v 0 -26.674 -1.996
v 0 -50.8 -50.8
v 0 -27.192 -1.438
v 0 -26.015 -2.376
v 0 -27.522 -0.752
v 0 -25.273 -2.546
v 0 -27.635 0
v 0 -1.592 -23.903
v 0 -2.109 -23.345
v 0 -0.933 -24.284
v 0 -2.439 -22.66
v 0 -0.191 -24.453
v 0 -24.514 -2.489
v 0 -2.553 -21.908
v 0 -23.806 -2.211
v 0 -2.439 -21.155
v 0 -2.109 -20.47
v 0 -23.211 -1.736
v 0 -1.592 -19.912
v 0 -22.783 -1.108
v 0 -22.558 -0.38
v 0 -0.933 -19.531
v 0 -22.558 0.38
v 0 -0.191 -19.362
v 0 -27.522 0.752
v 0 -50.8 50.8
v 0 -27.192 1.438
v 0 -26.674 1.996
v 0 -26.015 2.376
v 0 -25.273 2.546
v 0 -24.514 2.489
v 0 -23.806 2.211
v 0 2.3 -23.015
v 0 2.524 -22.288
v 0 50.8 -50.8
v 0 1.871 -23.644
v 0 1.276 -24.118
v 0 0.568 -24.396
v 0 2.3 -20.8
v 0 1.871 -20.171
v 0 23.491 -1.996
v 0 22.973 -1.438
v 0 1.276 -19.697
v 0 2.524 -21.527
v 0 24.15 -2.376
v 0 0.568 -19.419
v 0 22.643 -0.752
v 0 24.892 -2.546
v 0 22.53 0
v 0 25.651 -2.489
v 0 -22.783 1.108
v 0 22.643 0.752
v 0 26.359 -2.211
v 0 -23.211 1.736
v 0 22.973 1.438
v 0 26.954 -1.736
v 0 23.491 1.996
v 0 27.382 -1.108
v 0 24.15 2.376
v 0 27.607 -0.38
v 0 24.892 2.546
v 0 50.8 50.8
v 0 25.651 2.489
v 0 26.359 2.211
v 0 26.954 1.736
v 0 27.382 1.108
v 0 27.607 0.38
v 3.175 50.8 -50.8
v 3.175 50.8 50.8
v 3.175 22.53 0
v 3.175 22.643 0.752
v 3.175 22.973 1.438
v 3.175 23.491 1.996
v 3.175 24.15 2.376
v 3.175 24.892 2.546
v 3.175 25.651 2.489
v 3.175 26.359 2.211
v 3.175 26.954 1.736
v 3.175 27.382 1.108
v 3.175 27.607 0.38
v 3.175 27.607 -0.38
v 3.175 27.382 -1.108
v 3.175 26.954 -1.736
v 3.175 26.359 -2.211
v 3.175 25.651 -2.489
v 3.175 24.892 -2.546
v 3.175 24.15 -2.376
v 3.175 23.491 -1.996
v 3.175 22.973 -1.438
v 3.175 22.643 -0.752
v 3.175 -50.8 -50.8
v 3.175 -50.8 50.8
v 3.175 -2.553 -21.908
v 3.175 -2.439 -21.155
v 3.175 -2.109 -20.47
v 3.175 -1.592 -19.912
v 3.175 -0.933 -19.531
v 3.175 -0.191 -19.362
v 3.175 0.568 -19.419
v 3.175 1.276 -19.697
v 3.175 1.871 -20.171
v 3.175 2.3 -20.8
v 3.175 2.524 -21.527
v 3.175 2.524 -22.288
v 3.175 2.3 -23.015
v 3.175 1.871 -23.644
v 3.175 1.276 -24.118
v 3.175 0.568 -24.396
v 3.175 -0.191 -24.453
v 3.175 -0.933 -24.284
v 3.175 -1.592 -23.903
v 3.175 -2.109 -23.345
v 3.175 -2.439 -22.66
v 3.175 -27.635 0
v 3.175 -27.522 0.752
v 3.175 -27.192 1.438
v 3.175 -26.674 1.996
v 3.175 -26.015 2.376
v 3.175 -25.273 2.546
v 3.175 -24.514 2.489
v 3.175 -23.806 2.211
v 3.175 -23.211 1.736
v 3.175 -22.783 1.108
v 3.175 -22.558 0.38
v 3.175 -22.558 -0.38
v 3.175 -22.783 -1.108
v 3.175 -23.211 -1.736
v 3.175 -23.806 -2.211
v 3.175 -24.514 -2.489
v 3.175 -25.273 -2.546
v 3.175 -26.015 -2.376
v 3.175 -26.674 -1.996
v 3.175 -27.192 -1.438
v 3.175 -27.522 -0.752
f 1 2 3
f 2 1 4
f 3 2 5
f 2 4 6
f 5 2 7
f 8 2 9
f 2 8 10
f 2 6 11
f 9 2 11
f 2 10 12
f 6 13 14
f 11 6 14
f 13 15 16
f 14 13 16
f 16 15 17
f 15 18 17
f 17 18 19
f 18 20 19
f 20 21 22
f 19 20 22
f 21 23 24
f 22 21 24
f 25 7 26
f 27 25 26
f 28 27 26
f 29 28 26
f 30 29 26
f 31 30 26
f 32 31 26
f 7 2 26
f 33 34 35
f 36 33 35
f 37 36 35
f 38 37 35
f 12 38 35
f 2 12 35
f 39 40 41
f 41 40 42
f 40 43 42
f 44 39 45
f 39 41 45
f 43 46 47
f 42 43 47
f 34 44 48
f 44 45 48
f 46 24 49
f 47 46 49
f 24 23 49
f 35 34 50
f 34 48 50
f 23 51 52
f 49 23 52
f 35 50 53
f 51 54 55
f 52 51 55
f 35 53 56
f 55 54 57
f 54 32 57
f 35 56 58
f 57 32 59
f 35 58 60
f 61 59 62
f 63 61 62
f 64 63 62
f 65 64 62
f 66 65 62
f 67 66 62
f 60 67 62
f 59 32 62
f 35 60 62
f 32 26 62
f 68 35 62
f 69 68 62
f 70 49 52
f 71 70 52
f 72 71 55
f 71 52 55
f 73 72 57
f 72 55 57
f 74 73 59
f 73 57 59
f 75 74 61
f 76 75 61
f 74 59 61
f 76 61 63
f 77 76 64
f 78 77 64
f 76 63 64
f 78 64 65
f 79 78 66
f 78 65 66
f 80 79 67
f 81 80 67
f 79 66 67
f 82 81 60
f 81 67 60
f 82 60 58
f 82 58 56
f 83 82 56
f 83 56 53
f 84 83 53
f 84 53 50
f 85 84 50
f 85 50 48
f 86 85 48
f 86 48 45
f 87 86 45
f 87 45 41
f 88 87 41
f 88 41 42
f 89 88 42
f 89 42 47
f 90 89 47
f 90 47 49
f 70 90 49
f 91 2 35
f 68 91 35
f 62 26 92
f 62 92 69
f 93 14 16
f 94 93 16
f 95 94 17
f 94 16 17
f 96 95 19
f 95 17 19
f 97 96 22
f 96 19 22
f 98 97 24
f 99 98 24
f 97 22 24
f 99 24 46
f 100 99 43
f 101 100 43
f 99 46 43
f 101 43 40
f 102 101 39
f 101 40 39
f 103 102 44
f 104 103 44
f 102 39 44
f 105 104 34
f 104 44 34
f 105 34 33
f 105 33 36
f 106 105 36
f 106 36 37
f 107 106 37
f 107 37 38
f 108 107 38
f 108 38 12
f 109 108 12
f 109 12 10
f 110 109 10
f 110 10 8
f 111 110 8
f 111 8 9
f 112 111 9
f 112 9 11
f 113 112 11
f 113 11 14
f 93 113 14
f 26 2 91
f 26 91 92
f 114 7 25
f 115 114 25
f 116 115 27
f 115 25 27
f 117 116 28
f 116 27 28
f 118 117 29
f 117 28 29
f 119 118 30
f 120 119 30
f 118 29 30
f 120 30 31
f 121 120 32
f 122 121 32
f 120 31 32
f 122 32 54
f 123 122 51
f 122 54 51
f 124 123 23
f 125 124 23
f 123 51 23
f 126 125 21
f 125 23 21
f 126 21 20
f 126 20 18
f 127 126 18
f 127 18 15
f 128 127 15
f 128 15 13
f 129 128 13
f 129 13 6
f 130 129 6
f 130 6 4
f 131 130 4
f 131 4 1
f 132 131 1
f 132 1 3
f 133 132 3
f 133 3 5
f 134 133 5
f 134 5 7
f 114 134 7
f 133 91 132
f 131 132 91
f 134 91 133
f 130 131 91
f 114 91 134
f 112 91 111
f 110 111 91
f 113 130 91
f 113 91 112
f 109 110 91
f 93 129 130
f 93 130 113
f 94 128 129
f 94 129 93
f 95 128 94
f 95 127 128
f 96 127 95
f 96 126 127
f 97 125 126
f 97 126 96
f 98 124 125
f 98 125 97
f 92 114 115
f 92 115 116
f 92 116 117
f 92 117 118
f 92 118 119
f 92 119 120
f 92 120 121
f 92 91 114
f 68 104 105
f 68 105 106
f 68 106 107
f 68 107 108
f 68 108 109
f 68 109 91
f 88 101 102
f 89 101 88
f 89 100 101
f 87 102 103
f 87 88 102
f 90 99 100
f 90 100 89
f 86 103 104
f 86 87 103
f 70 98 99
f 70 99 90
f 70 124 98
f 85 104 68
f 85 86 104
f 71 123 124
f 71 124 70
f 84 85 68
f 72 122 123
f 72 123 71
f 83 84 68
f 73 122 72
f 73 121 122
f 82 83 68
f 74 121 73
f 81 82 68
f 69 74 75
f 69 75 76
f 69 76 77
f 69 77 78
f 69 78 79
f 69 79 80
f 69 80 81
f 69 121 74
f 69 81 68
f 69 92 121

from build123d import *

# Parameters (mm, degrees)
F0_W     = 101.6
F0_H     = 101.6
F1_DEPTH = 3.175
F3_D     = 5.1054
F3_DEPTH = 25
F3_TIP   = 1.5338169022


# Not quite as in the source:
# - a length typed as a fraction of an inch, garbled in the dataset ("3 / 203.2 mm" for 3/8 in), is restored


with BuildPart() as f1:
    # F0 (on Right) → F1 (new body)
    with BuildSketch(Plane.YZ):
        Rectangle(F0_W, F0_H)
    extrude(amount=F1_DEPTH)

    # F3
    with Locations(Plane.YZ.offset(3.175)):
        with Locations((0, -21.9075), (-25.0825, 0), (25.0825, 0)):
            Hole(F3_D / 2, depth=F3_DEPTH)
            with Locations((0, 0, -(F3_DEPTH + F3_TIP / 2))):  # 118° drill point
                Cone(0, F3_D / 2, F3_TIP, mode=Mode.SUBTRACT)


solid = f1.part
